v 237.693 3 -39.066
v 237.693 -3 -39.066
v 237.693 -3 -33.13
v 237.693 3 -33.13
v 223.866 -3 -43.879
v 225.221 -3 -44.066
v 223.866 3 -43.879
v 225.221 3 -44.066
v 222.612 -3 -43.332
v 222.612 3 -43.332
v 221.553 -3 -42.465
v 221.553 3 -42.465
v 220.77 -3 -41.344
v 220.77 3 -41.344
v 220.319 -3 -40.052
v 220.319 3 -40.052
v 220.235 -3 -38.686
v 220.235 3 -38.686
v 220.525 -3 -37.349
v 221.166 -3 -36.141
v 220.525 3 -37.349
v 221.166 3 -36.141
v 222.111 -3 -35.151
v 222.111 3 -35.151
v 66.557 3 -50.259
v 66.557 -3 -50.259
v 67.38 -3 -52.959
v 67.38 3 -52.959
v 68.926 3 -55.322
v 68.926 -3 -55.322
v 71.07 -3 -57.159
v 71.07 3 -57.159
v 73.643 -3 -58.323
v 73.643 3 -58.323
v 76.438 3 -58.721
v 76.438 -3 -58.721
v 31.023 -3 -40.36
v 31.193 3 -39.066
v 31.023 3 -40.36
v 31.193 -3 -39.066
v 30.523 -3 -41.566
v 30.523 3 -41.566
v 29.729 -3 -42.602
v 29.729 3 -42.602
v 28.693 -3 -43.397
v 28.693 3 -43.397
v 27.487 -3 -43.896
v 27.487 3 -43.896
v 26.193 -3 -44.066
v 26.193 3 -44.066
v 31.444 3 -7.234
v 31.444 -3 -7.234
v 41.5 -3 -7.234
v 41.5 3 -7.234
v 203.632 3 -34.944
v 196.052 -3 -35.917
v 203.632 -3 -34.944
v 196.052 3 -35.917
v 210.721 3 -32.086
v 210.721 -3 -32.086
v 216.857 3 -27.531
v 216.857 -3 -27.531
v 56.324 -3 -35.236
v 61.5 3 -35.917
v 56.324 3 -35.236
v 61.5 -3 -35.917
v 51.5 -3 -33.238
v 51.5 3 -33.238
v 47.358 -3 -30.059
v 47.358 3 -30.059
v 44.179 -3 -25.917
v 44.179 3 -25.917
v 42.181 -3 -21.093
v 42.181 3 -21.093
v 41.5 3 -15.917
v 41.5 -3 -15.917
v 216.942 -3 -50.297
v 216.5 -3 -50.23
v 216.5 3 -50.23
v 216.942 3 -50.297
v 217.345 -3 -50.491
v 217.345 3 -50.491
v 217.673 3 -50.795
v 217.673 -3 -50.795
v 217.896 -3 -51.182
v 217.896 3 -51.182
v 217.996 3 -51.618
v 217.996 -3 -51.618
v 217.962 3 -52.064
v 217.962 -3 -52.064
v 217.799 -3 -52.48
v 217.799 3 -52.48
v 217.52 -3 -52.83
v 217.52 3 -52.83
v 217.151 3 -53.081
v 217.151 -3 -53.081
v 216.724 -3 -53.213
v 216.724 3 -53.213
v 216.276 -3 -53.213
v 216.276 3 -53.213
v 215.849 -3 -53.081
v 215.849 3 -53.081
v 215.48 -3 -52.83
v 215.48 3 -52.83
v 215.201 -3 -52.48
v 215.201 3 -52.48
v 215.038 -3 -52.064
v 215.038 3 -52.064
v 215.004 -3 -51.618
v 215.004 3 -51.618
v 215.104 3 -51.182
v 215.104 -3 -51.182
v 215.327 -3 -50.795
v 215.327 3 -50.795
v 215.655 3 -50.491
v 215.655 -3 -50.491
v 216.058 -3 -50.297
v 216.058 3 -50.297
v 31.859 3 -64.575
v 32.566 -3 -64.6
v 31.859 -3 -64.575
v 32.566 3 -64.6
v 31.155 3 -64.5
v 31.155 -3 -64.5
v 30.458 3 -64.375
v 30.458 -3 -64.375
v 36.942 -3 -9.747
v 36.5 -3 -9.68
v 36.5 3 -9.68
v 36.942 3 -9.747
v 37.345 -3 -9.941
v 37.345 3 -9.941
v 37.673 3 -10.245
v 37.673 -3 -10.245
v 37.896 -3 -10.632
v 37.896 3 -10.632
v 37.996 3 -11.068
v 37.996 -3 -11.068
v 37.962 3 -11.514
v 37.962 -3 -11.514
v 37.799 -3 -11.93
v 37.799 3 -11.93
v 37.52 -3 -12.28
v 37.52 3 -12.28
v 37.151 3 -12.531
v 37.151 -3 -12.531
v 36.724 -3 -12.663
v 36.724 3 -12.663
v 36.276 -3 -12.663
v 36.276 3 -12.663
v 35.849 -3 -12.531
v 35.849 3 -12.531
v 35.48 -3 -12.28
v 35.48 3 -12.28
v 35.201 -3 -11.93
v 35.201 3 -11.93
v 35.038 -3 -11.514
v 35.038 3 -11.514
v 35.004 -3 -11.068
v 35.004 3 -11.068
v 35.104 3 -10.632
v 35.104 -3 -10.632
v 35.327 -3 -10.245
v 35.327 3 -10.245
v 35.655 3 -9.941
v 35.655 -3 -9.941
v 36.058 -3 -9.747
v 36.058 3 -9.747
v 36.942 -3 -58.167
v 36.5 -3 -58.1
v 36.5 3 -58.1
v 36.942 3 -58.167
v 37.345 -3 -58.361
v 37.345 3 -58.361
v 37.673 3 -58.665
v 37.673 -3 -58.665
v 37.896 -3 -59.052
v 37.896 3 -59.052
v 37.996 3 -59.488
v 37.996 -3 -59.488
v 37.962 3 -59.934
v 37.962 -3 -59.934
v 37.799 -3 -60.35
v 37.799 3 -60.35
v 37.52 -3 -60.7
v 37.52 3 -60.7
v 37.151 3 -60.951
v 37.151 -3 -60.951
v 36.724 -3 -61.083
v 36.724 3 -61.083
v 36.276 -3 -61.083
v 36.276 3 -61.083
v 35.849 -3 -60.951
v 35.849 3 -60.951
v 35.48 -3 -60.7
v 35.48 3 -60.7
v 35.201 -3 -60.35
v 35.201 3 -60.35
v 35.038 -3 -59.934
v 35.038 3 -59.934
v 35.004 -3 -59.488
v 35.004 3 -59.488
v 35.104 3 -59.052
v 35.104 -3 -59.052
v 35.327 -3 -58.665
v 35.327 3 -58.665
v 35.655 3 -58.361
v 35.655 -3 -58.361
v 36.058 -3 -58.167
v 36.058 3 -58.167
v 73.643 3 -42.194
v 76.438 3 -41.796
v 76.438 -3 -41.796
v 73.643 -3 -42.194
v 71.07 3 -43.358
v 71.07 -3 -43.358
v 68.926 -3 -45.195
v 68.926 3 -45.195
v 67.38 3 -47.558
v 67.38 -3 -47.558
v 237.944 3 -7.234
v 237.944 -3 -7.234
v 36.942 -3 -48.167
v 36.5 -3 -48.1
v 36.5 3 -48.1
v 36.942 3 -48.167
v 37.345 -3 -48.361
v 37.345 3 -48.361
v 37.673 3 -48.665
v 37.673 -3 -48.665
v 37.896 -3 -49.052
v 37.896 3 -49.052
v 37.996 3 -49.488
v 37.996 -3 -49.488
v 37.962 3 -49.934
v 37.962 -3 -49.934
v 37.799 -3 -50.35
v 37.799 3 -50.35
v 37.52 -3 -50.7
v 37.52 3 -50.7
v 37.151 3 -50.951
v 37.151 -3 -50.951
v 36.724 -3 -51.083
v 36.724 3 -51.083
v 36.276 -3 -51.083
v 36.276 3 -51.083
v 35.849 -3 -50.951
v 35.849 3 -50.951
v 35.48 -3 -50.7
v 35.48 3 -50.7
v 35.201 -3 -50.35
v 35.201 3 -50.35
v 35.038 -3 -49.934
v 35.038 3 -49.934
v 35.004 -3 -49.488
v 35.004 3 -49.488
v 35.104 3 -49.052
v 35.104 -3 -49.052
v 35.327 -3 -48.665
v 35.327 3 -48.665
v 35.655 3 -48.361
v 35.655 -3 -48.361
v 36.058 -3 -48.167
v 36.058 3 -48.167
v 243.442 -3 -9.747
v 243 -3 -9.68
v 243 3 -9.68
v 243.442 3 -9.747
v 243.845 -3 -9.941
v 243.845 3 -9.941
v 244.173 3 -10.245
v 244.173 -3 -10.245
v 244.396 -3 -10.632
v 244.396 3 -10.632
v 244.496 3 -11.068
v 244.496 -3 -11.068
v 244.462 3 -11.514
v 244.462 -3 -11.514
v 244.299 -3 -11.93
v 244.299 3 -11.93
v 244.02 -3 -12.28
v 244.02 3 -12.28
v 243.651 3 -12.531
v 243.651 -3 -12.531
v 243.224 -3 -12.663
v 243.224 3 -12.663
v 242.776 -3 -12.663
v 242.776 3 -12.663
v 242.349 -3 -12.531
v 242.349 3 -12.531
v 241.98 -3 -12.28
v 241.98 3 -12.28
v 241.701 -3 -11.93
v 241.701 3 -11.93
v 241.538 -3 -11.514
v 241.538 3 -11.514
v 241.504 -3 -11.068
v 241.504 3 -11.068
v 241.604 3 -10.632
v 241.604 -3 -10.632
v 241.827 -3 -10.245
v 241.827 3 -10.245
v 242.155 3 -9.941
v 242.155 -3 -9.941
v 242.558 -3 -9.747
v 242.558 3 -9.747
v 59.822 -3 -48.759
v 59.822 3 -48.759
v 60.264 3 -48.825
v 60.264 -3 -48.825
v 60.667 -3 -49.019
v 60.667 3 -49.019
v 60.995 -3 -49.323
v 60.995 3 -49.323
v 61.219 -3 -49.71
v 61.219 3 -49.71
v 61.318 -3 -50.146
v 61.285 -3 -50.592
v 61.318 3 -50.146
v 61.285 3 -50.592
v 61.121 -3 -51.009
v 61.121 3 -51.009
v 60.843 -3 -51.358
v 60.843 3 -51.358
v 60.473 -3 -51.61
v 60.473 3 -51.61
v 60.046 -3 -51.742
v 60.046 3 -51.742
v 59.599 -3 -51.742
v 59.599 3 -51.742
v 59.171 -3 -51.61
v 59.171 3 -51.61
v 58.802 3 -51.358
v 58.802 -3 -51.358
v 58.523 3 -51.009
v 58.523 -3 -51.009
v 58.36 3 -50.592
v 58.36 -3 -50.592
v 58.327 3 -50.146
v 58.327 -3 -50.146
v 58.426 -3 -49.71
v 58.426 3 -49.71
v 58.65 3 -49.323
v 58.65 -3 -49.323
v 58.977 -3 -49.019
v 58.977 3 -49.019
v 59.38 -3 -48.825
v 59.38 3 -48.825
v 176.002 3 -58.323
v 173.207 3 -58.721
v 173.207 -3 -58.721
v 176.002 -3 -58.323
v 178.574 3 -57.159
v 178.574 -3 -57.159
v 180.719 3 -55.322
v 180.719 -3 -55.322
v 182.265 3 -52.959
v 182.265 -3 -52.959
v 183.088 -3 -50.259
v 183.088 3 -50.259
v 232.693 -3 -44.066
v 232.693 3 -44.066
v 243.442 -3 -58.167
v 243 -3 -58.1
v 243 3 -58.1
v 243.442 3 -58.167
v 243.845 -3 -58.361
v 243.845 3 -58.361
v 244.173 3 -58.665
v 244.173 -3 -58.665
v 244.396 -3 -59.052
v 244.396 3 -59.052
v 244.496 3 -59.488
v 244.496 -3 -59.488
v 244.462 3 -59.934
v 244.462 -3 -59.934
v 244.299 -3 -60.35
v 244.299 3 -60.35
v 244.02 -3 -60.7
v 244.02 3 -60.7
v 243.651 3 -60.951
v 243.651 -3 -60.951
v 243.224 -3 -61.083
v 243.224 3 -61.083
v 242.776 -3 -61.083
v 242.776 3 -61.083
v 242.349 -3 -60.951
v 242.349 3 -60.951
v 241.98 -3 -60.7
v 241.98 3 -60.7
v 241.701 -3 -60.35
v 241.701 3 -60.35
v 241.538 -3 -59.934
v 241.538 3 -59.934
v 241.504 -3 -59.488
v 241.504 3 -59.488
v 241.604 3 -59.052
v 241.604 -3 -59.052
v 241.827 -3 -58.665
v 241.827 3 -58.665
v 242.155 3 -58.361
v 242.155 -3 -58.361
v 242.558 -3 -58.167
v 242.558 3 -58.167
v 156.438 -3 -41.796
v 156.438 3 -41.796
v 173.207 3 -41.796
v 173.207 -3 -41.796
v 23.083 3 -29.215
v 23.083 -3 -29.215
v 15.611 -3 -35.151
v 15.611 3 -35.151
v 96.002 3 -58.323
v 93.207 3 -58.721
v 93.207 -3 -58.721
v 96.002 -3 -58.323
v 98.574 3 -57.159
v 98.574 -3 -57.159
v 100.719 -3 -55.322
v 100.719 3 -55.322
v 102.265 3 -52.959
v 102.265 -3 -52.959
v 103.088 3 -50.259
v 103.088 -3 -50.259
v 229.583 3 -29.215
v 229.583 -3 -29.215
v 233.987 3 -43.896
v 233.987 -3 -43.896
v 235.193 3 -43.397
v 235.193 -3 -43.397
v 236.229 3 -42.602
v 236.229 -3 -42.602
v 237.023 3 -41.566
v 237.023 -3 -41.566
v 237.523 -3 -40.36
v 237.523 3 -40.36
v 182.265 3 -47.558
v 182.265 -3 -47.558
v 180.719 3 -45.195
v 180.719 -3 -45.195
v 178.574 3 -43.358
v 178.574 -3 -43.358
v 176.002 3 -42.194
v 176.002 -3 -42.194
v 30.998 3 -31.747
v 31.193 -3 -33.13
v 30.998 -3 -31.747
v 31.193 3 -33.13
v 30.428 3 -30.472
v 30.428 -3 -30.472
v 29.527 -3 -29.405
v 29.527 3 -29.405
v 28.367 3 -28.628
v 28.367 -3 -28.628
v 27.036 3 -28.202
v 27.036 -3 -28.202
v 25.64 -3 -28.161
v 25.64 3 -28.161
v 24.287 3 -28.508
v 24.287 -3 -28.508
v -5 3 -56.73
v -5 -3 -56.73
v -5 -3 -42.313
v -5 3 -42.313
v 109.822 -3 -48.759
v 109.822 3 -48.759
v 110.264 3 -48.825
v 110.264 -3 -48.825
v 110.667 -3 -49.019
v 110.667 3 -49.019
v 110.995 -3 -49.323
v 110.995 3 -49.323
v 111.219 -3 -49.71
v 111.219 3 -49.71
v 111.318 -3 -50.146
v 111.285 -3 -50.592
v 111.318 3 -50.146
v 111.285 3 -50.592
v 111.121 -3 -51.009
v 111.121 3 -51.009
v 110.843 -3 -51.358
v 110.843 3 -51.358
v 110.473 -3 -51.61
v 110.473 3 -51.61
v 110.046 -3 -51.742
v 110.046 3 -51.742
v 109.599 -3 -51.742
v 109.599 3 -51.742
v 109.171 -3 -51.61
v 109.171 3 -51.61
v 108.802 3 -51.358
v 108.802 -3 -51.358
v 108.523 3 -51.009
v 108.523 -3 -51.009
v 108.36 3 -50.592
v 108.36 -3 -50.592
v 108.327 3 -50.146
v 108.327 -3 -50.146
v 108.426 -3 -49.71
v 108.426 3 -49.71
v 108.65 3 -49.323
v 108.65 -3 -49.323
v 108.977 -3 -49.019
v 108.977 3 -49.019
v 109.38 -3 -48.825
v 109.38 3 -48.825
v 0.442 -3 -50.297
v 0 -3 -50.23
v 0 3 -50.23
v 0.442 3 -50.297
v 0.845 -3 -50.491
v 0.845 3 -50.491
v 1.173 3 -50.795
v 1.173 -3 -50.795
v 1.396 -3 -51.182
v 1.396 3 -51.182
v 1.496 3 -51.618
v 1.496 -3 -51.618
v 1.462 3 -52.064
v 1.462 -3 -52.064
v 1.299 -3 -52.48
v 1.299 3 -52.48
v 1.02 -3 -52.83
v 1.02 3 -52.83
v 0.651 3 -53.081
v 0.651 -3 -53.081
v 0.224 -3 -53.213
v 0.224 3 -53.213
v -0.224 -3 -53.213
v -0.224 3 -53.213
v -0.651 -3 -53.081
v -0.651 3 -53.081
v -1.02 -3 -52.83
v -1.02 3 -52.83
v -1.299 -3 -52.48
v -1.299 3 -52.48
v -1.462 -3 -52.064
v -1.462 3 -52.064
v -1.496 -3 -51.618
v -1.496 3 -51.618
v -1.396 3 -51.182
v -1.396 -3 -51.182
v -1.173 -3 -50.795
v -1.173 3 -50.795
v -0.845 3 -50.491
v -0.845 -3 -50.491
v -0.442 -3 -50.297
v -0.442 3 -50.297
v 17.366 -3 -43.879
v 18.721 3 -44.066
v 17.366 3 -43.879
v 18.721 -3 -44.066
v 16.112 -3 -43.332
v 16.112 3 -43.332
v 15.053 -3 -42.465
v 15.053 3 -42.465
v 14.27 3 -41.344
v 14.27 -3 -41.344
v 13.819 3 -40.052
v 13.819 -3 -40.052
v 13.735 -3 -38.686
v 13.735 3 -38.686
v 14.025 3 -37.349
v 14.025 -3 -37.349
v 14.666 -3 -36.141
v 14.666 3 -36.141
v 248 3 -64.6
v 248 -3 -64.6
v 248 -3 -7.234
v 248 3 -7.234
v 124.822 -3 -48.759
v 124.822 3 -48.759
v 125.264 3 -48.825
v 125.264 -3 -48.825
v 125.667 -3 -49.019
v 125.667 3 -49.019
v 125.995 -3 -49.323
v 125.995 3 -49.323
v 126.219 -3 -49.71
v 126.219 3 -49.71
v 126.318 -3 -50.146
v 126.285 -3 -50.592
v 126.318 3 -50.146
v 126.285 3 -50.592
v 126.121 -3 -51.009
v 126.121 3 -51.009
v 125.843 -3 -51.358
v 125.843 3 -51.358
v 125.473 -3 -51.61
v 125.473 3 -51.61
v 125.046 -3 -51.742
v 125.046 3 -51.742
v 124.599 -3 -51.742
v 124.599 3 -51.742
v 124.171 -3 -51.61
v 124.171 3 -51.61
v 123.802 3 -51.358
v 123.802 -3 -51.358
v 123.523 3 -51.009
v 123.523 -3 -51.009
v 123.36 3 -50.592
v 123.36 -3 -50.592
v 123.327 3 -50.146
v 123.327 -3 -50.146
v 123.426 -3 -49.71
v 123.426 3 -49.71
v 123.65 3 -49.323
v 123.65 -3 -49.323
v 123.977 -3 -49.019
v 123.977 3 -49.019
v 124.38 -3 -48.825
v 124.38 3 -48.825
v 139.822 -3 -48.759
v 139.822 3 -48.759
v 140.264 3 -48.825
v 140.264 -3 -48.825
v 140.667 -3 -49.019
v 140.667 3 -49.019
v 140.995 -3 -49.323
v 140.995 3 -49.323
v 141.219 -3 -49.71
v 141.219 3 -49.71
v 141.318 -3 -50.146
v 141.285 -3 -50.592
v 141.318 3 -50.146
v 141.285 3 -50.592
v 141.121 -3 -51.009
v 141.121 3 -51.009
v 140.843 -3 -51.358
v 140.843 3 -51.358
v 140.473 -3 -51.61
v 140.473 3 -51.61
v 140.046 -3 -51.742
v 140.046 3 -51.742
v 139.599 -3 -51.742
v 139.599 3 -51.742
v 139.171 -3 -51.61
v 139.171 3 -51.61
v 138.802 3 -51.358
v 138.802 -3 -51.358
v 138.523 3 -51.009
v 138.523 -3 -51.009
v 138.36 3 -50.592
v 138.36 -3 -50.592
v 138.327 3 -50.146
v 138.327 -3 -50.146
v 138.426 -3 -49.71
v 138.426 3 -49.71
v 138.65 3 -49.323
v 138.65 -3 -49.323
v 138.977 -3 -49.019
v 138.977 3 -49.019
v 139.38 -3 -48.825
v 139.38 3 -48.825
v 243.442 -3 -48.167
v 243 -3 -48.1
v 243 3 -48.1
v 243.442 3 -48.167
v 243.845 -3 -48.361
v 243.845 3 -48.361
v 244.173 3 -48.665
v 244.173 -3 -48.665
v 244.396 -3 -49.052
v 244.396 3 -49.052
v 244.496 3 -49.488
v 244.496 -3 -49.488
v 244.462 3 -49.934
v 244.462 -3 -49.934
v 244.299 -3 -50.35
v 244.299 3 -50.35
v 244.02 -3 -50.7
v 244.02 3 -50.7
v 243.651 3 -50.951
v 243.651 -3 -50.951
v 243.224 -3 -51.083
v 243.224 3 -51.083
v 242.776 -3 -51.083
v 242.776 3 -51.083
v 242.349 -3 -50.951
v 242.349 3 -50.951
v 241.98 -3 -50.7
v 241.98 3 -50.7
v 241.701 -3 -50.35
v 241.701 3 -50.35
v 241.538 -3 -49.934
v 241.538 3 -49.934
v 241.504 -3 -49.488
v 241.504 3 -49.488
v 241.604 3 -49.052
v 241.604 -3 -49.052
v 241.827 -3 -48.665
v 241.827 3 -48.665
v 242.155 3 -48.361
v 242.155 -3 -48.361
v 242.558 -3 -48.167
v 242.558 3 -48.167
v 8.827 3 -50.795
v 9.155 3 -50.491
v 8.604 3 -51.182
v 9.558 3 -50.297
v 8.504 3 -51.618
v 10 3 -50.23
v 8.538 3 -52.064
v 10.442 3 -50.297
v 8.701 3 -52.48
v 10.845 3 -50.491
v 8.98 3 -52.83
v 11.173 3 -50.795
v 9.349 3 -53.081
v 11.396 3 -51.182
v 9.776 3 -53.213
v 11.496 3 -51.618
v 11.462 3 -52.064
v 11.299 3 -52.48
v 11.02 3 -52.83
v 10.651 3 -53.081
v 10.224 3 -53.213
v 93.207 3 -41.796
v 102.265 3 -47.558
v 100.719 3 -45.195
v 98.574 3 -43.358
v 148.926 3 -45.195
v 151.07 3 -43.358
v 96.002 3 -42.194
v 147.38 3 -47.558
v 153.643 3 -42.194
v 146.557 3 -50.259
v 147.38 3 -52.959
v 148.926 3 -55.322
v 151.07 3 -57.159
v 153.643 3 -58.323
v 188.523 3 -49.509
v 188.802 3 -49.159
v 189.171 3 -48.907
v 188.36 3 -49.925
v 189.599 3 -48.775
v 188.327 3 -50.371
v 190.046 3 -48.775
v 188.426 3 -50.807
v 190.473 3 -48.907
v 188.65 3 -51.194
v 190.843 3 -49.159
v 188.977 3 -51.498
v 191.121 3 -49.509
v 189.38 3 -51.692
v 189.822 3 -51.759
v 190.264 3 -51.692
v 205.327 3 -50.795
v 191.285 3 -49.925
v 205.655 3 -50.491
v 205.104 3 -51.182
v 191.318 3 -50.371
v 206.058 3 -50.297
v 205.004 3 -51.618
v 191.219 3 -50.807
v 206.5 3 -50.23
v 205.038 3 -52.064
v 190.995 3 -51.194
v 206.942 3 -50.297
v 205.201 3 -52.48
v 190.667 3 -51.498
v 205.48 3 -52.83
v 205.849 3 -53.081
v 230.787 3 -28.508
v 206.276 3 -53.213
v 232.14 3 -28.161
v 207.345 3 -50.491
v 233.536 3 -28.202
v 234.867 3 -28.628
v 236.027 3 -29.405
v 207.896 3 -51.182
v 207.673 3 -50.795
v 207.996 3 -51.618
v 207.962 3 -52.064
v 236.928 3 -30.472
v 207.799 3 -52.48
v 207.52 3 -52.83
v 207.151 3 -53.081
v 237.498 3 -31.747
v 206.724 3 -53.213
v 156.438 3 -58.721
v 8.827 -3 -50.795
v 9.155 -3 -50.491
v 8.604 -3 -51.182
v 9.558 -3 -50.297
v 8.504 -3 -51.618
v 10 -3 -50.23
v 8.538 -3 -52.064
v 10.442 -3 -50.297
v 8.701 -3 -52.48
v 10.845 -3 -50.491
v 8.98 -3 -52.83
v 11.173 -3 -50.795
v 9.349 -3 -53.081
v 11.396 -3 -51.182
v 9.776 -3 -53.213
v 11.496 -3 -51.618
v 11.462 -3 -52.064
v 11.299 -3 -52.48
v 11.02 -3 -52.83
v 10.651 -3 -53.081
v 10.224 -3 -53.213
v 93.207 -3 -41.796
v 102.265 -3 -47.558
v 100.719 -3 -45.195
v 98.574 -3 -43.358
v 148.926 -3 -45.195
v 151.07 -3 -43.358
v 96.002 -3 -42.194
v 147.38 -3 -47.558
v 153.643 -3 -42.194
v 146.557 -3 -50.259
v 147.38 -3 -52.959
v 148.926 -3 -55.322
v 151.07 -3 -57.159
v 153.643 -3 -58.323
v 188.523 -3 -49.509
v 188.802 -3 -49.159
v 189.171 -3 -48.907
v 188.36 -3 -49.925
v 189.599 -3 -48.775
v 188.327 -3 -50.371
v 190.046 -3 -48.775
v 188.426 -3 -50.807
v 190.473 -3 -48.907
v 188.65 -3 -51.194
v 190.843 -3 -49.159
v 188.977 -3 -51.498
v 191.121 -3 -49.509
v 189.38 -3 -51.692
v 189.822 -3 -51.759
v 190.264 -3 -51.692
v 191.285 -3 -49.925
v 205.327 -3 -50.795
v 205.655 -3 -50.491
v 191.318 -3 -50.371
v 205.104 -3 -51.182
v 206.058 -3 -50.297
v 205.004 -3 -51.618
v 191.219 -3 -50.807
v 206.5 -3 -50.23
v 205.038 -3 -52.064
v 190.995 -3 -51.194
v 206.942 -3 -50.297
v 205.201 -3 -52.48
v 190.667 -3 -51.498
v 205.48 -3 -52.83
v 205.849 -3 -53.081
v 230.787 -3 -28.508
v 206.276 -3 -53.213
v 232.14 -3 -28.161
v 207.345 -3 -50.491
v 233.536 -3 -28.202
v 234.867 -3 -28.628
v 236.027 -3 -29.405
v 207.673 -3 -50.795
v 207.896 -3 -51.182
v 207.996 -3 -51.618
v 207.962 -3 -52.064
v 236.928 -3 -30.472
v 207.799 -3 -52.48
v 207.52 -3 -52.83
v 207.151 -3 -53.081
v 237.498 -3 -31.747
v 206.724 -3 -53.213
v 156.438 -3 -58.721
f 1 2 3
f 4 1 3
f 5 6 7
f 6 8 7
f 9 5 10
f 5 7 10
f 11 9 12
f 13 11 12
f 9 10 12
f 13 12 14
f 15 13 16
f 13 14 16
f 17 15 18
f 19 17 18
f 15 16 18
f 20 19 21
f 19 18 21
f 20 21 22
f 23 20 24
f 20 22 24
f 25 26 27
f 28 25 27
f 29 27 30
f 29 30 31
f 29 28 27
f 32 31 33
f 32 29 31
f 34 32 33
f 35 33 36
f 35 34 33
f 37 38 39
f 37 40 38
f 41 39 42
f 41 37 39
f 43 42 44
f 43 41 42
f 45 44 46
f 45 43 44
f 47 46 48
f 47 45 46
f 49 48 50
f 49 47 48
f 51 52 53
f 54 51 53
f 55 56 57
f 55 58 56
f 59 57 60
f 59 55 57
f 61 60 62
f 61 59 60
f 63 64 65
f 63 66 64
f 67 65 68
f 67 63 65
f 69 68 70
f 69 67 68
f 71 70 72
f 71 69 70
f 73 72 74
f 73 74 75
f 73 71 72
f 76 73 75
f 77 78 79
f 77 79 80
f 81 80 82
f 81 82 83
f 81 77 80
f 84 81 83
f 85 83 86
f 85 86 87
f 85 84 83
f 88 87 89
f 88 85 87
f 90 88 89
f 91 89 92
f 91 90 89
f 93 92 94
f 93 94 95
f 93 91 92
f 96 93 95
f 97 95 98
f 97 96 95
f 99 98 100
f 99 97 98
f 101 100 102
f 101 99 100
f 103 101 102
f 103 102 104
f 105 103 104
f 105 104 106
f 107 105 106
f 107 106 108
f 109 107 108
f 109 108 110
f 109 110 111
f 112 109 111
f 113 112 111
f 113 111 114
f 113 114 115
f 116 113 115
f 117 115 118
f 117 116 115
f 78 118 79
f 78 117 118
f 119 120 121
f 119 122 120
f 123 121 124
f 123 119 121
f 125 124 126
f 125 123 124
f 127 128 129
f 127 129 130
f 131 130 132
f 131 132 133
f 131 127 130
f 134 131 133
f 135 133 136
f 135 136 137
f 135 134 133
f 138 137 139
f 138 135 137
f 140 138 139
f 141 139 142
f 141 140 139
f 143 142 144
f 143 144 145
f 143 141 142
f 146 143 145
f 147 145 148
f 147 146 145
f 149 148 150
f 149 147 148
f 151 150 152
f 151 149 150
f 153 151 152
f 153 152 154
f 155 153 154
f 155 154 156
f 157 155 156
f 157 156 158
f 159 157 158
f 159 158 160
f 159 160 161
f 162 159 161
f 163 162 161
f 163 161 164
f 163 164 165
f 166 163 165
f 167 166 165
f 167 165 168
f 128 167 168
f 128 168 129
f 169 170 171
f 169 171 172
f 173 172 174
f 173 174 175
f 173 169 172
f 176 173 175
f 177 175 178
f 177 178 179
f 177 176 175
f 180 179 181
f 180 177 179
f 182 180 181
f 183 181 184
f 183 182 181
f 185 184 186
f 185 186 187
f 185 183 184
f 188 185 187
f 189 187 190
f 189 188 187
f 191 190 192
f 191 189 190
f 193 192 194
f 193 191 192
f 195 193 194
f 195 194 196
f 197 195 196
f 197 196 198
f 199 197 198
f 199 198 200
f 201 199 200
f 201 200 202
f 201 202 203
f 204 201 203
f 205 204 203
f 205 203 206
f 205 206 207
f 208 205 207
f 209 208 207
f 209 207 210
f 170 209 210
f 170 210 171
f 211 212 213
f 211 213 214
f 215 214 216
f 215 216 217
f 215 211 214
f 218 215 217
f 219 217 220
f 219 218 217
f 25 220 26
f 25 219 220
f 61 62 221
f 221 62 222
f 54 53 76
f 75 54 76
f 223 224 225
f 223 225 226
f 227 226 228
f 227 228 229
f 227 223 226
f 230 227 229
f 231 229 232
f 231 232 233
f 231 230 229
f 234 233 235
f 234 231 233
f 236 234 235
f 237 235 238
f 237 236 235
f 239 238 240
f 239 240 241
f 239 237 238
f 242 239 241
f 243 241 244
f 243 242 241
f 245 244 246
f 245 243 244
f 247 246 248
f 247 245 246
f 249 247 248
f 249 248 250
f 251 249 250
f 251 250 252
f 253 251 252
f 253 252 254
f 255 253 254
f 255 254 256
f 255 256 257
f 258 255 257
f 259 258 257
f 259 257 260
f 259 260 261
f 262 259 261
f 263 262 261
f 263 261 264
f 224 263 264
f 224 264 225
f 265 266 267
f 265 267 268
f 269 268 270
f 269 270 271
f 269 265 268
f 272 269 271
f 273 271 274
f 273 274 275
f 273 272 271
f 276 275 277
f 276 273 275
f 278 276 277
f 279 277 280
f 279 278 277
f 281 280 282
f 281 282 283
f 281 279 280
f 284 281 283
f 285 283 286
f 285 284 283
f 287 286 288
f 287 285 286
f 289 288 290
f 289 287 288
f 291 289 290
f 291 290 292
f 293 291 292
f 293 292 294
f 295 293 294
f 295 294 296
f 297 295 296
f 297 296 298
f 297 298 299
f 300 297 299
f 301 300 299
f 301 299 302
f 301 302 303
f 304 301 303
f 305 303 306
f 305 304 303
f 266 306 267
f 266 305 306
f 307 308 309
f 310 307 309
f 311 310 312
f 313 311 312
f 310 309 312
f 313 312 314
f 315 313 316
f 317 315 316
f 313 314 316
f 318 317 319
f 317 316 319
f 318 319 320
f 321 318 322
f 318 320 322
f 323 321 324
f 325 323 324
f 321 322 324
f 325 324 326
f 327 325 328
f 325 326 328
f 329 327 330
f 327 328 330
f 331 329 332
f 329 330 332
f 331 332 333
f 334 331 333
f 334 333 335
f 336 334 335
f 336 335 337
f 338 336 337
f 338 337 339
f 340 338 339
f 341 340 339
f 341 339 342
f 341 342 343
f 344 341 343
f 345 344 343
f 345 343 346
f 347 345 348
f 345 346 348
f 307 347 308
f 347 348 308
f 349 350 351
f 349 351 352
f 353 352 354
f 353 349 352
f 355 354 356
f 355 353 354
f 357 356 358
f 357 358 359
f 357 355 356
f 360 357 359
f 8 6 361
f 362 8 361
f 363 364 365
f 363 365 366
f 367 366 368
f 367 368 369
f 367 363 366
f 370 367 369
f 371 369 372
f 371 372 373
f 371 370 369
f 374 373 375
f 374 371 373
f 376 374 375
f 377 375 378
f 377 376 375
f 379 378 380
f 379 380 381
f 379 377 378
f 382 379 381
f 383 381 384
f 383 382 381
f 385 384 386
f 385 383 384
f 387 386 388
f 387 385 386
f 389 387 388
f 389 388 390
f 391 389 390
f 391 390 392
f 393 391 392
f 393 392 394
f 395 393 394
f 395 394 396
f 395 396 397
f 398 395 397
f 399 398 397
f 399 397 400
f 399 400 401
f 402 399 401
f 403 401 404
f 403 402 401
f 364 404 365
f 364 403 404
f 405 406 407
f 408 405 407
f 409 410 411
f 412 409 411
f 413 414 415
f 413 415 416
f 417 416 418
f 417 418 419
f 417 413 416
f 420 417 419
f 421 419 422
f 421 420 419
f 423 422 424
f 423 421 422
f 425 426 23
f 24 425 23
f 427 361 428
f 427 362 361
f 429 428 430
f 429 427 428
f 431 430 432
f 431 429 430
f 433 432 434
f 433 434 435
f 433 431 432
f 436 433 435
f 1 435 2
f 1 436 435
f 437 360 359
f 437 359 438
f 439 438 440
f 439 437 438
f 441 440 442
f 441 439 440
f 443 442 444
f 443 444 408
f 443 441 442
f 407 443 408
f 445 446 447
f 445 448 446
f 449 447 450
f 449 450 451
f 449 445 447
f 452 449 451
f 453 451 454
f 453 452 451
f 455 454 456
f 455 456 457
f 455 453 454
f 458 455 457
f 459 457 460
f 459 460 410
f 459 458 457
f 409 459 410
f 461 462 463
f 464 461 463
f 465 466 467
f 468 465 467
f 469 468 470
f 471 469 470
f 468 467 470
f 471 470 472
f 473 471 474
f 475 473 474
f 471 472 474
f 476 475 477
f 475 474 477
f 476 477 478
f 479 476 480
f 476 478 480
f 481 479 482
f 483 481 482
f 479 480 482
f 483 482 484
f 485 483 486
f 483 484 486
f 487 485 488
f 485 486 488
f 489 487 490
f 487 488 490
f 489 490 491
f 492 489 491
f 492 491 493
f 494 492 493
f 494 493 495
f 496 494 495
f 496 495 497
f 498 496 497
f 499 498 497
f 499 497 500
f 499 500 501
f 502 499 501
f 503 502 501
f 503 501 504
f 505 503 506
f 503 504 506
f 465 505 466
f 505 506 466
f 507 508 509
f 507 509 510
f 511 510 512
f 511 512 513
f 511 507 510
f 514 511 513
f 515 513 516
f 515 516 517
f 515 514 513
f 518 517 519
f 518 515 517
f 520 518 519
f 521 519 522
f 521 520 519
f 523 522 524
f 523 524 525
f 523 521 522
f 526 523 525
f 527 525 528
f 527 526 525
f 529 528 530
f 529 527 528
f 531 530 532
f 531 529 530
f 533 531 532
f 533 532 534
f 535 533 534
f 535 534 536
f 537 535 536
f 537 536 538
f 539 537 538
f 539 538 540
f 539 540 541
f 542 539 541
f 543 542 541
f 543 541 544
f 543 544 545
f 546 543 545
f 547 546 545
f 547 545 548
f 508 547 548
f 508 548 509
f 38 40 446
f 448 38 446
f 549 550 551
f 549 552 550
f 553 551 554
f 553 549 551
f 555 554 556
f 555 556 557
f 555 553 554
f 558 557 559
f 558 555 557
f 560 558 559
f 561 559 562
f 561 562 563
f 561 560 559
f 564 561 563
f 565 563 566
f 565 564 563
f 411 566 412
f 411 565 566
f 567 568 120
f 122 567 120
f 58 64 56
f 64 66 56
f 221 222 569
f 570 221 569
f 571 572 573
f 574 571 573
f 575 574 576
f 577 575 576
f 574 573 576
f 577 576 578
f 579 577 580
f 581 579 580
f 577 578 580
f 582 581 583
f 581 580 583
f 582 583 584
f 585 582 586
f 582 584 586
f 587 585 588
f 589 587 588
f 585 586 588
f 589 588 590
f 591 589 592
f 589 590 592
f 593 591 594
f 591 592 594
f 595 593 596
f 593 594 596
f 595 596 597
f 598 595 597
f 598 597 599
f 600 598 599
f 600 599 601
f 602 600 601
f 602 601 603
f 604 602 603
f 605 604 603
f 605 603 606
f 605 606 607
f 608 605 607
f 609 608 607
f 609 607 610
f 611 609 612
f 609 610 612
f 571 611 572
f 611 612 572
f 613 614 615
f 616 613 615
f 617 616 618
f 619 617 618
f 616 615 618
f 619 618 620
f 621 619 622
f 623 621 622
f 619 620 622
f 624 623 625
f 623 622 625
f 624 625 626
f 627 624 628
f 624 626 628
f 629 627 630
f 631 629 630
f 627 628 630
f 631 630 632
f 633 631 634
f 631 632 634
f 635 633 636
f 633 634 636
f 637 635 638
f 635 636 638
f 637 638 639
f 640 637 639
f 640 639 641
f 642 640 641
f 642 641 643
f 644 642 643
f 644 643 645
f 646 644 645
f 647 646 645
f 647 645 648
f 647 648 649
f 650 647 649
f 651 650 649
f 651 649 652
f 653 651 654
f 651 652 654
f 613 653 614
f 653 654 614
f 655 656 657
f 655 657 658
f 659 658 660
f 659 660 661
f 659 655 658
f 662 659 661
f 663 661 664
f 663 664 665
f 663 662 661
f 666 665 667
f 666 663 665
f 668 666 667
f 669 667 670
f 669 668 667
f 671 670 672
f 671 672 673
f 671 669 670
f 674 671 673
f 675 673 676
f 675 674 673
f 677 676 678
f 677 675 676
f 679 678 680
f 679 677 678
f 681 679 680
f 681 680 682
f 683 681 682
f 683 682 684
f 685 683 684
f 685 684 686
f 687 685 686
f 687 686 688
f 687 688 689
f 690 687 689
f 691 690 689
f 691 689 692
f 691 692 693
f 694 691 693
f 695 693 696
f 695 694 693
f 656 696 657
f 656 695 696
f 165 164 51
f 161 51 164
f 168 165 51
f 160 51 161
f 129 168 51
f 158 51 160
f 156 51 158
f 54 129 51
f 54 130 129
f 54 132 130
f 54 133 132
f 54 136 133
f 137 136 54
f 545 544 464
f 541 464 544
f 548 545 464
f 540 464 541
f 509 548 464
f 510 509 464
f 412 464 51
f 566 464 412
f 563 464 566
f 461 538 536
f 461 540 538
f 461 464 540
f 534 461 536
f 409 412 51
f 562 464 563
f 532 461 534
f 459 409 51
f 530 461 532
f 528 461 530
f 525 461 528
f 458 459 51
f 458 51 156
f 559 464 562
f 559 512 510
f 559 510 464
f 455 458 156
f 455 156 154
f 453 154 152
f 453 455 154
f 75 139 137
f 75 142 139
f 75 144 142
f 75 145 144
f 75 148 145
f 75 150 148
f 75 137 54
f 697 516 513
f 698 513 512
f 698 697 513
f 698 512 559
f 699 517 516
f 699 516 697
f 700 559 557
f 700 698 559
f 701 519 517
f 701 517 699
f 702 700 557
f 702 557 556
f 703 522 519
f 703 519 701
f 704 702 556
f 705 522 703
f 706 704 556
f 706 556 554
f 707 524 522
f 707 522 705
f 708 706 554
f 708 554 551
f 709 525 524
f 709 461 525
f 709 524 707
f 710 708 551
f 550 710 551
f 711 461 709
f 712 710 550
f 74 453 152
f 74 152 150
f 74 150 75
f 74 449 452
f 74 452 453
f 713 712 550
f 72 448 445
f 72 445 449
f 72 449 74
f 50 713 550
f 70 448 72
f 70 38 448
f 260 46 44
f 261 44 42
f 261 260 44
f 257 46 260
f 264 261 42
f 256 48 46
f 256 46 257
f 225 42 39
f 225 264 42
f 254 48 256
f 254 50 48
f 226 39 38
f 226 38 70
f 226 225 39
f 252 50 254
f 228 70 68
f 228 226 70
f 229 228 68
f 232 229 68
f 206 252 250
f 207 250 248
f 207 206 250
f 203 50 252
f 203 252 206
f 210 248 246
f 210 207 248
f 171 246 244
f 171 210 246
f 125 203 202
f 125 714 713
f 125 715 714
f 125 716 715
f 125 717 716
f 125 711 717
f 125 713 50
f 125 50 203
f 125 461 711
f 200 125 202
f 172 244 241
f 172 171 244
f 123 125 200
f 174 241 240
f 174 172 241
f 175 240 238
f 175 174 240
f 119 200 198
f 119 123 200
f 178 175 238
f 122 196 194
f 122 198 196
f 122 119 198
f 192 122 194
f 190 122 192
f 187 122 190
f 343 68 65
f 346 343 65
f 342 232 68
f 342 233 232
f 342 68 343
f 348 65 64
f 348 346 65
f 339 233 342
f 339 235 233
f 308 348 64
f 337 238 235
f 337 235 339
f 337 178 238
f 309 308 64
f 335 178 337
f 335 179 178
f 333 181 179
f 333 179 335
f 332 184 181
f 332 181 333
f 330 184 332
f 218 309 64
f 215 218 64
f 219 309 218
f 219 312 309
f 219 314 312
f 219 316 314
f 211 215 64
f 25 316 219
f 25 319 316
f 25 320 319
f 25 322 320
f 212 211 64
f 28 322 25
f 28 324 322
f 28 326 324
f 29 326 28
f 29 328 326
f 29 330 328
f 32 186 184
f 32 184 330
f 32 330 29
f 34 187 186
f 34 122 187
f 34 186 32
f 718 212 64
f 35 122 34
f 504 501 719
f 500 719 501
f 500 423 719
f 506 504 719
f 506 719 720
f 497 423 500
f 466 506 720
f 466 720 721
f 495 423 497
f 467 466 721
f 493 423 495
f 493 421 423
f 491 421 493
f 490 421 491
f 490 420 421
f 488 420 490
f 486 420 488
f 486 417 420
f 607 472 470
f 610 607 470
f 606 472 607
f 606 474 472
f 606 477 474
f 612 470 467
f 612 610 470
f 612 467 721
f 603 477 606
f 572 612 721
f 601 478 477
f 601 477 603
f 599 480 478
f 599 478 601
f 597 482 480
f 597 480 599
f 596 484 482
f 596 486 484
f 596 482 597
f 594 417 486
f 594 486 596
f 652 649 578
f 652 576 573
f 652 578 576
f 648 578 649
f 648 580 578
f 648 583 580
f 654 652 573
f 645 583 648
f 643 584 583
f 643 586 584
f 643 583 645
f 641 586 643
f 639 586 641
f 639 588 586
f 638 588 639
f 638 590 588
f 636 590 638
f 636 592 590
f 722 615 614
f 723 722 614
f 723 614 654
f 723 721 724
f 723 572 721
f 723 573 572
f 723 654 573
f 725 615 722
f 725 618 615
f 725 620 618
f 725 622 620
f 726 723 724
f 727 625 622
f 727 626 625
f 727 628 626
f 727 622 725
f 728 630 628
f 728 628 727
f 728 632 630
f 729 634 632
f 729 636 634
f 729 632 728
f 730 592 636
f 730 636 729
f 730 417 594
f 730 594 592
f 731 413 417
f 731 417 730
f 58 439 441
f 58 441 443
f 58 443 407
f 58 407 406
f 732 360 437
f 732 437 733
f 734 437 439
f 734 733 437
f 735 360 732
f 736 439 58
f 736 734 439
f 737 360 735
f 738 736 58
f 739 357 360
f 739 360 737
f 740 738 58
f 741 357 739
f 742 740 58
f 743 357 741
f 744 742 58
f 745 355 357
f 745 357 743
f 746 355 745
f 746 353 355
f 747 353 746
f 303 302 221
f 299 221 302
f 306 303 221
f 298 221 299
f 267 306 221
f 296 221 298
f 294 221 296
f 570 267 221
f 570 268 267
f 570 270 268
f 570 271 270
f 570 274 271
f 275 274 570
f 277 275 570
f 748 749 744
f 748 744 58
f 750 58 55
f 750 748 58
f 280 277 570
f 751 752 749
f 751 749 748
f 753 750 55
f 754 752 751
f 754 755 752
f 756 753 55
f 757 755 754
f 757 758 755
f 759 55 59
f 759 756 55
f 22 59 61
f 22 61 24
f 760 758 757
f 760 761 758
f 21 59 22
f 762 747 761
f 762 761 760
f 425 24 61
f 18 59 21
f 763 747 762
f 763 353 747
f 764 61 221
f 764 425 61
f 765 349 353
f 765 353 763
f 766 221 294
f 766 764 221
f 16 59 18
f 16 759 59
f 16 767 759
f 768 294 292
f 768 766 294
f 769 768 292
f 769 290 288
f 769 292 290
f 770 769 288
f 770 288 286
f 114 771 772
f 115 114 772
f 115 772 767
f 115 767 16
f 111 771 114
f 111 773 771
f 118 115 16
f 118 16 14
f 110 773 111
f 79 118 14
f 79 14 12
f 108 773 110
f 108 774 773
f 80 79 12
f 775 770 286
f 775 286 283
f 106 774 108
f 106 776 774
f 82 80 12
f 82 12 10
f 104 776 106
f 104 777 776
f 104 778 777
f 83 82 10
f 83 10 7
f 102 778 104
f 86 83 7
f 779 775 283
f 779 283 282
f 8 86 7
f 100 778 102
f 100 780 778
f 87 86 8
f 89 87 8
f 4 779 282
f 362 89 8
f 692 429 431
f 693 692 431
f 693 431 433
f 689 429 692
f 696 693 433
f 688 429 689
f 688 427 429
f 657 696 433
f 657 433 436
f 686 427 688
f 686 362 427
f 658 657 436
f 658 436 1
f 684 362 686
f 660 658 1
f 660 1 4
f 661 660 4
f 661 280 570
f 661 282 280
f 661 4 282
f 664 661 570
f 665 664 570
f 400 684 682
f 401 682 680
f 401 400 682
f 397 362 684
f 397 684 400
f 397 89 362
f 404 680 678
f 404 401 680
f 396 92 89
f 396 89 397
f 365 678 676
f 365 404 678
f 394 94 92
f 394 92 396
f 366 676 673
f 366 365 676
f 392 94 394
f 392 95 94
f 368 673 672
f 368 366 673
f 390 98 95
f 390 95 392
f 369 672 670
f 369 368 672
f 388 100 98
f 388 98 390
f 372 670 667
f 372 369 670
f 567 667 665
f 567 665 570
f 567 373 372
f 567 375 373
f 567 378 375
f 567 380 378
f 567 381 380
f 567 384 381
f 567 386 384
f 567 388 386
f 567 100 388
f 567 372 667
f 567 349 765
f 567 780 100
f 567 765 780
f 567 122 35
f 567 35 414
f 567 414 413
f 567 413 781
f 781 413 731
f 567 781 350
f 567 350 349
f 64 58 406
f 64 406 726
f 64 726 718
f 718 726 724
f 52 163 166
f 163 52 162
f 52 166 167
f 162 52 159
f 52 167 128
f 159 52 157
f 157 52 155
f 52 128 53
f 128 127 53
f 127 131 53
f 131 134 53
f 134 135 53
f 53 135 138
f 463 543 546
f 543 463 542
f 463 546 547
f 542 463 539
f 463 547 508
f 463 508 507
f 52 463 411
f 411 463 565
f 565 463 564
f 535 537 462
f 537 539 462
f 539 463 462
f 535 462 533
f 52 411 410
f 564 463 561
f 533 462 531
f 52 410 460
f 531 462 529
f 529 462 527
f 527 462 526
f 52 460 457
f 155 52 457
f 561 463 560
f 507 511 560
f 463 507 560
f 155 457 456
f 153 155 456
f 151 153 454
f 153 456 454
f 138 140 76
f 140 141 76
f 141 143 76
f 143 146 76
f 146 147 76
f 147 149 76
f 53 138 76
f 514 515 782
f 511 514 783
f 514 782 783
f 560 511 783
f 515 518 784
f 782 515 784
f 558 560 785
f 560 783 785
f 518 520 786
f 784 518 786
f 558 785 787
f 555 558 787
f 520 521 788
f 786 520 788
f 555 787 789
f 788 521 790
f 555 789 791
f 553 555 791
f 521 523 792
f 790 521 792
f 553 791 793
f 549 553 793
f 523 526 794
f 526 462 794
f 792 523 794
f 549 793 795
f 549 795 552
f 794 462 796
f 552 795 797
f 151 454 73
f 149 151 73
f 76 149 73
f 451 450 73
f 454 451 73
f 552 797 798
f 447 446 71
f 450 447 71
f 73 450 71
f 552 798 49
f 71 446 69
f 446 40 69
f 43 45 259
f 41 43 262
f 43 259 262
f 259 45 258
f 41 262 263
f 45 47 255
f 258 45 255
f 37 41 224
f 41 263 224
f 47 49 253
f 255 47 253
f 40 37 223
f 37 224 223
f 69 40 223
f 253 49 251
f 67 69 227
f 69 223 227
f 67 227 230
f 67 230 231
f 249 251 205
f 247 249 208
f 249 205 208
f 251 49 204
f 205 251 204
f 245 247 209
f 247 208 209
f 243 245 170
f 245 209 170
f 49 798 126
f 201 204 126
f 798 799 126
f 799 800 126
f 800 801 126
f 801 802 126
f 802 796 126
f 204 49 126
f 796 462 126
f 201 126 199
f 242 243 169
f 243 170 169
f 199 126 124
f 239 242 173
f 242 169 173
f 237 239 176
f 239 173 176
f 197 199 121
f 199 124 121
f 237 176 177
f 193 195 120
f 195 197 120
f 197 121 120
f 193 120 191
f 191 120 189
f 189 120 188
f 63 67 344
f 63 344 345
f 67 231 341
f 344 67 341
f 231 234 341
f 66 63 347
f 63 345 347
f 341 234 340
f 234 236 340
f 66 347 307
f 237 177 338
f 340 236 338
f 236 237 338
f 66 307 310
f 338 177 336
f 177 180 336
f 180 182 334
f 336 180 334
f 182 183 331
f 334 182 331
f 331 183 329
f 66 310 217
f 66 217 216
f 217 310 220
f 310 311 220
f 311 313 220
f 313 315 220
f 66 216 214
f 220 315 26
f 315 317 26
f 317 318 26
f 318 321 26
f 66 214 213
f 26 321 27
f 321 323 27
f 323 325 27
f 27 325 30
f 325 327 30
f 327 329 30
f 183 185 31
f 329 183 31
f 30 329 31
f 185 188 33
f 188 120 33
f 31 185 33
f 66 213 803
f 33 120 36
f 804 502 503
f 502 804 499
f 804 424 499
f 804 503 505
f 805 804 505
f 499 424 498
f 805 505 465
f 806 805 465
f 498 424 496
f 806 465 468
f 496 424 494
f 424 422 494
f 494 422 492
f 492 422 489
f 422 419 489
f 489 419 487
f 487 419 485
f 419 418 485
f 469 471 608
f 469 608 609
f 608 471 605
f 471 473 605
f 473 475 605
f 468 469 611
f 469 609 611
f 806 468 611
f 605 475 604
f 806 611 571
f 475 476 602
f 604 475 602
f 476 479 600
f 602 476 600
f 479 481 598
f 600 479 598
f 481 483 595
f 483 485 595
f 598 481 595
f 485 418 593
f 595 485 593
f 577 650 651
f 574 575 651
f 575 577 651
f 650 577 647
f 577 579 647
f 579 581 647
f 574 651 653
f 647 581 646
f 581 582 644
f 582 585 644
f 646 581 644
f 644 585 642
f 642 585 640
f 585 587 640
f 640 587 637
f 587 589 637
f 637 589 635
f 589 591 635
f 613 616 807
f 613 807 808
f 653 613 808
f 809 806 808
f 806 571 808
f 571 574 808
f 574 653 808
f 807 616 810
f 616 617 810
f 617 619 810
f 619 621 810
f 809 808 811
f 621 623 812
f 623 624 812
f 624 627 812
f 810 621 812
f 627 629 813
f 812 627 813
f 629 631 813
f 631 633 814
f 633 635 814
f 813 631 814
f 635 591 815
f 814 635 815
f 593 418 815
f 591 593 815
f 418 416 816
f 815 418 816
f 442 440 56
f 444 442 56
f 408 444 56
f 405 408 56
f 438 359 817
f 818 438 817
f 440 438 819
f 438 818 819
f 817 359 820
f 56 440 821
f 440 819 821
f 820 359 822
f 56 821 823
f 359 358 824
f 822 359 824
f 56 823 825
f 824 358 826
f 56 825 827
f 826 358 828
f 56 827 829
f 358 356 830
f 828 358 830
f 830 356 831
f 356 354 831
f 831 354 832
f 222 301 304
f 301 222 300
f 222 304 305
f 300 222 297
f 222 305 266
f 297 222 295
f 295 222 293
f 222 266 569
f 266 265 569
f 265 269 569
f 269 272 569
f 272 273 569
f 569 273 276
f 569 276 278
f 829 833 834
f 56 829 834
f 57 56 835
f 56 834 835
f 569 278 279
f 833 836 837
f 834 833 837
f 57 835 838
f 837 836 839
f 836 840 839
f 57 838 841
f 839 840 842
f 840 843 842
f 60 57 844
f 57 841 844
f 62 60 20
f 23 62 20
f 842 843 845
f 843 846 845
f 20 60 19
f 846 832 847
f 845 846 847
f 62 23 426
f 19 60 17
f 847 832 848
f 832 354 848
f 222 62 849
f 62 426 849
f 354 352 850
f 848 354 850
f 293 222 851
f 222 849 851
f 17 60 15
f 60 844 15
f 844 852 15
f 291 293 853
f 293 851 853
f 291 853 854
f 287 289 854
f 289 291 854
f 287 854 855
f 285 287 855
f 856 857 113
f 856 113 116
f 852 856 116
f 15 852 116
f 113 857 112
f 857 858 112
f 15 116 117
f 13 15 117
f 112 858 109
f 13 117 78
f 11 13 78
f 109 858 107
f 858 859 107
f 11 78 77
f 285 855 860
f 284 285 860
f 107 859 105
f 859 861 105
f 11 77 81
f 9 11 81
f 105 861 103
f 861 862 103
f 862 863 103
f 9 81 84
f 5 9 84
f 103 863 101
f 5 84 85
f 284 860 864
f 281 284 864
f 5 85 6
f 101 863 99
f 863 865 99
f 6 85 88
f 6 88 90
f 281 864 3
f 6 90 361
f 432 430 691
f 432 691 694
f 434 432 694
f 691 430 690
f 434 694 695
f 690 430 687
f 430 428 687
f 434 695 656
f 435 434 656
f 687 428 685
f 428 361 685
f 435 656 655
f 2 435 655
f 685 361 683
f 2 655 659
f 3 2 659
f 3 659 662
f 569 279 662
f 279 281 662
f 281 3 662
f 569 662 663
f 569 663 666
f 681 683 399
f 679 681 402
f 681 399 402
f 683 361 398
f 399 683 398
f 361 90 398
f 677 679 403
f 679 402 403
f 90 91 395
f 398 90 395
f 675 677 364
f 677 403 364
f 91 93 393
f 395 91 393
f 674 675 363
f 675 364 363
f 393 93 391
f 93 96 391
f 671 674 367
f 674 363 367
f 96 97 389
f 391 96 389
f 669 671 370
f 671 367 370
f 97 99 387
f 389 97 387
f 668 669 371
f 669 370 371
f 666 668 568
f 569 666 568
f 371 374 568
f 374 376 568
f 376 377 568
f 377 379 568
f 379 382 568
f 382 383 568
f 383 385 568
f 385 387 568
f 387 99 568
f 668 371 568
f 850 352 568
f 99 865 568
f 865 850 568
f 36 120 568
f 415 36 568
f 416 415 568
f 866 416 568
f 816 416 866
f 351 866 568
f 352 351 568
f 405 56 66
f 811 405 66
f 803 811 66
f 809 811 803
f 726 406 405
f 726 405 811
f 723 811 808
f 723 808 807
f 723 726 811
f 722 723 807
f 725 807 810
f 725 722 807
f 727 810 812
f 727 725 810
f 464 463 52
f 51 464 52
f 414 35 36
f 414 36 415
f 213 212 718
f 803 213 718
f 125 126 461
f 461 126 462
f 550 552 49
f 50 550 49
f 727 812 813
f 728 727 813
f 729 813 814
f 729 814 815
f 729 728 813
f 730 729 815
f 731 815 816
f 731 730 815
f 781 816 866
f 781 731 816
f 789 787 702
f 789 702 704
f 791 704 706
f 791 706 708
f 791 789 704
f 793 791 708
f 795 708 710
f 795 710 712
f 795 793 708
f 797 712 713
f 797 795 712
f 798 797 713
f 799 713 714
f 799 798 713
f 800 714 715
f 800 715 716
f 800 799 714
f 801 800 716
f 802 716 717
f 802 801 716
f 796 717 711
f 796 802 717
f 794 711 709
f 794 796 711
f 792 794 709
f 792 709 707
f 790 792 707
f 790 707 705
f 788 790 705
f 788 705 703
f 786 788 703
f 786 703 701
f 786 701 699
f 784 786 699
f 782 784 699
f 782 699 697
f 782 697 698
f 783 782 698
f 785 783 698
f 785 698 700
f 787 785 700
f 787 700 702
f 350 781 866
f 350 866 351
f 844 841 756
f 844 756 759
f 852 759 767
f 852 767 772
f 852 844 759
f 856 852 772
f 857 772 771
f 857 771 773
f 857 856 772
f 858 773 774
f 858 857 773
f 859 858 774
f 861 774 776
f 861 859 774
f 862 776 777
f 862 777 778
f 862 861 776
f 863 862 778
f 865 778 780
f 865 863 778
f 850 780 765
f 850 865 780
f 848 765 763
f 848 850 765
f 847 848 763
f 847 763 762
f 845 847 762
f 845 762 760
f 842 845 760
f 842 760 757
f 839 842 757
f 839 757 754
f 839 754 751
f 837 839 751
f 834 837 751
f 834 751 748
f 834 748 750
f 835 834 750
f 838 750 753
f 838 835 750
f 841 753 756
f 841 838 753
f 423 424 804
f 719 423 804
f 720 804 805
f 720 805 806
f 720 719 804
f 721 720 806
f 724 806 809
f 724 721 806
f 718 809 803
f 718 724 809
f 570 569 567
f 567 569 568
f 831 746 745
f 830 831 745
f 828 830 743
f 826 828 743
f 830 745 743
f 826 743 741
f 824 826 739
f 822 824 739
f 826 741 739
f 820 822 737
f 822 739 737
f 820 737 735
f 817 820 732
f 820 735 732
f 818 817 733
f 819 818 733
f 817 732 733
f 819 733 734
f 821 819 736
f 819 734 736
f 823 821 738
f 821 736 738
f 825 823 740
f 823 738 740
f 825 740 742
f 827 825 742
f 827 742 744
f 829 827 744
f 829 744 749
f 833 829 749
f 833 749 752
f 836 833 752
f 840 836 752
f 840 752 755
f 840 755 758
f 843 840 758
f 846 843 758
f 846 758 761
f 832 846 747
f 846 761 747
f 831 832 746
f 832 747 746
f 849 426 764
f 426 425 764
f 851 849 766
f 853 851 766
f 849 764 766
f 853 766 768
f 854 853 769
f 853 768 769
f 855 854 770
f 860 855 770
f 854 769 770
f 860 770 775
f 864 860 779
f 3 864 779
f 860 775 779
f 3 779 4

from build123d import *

# Parameters (mm, degrees)
SKETCH1_R           = 1.5
BOSS_EXTRUDE1_DEPTH = 3
SKETCH4_R           = 1.5
CUT_EXTRUDE2_DEPTH  = 7
SKETCH5_W           = 46.5
SKETCH5_H           = 2
CUT_EXTRUDE3_DEPTH  = 7
CUT_EXTRUDE4_DEPTH  = 7
CUT_EXTRUDE5_DEPTH  = 7
BOSS_EXTRUDE2_START = -6
SKETCH8_R           = 1.5
BOSS_EXTRUDE2_DEPTH = 6
SKETCH9_R           = 1.5
CUT_EXTRUDE6_DEPTH  = 6
SKETCH10_R          = 1.5
CUT_EXTRUDE7_DEPTH  = 6
SKETCH11_W          = 36.769244088
SKETCH11_H          = 16.925373541
CUT_EXTRUDE8_DEPTH  = 14
FILLET2_R           = 5
FILLET3_R           = 10
FILLET4_R           = 20
FILLET5_R           = 30
FILLET6_R           = 10


with BuildPart() as part:
    # Sketch1 → Boss-Extrude1 (new body)
    # profile 1 of 4: a face of its own
    with BuildSketch(Plane(origin=(0, 0, 0), x_dir=(1, 0, 0), z_dir=(0, 1, 0))):
        Polygon((5, 16.666723622), (5, 56.73), (-5, 56.73), (-5, 5.234024539), (5, 5.234024539), (31.5, 5.234024539), (41.5, 5.234024539), (41.5, 64.6), (31.5, 64.6), (31.5, 54.48), (31.5, 16.666723622), align=None)
        with Locations(Location((0, 10.18, 0), (0, 0, 270))):
            Circle(SKETCH1_R, mode=Mode.SUBTRACT)
        with Locations(Location((36.5, 11.18, 0), (0, 0, 270))):
            Circle(SKETCH1_R, mode=Mode.SUBTRACT)
        with Locations(Location((0, 51.73, 0), (0, 0, 270))):
            Circle(SKETCH1_R, mode=Mode.SUBTRACT)
        with Locations(Location((36.5, 49.6, 0), (0, 0, 270))):
            Circle(SKETCH1_R, mode=Mode.SUBTRACT)
        with Locations(Location((36.5, 59.6, 0), (0, 0, 270))):
            Circle(SKETCH1_R, mode=Mode.SUBTRACT)
    # profile 2 of 4: a face of its own
    with BuildSketch(Plane(origin=(0, 0, 0), x_dir=(1, 0, 0), z_dir=(0, 1, 0))):
        Polygon((-5, 56.73), (5, 56.73), (31.5, 54.48), (31.5, 64.6), align=None)
    # profile 3 of 4: a face of its own
    with BuildSketch(Plane(origin=(0, 0, 0), x_dir=(1, 0, 0), z_dir=(0, 1, 0))):
        Polygon((5, 16.666723622), (5, 56.73), (-5, 56.73), (-5, 5.234024539), (5, 5.234024539), (31.5, 5.234024539), (41.5, 5.234024539), (41.5, 64.6), (31.5, 64.6), (31.5, 54.48), (31.5, 16.666723622), align=None)
        with Locations(Location((0, 10.18, 0), (0, 0, 270))):
            Circle(SKETCH1_R, mode=Mode.SUBTRACT)
        with Locations(Location((36.5, 11.18, 0), (0, 0, 270))):
            Circle(SKETCH1_R, mode=Mode.SUBTRACT)
        with Locations(Location((0, 51.73, 0), (0, 0, 270))):
            Circle(SKETCH1_R, mode=Mode.SUBTRACT)
        with Locations(Location((36.5, 49.6, 0), (0, 0, 270))):
            Circle(SKETCH1_R, mode=Mode.SUBTRACT)
        with Locations(Location((36.5, 59.6, 0), (0, 0, 270))):
            Circle(SKETCH1_R, mode=Mode.SUBTRACT)
    # profile 4 of 4: a face of its own
    with BuildSketch(Plane(origin=(0, 0, 0), x_dir=(1, 0, 0), z_dir=(0, 1, 0))):
        Polygon((31.5, 54.48), (5, 56.73), (5, 16.666723622), (31.5, 16.666723622), align=None)
    extrude(amount=BOSS_EXTRUDE1_DEPTH)

    # Sketch4 → Cut-Extrude2 (cut)
    with BuildSketch(Plane(origin=(0, 3, 0), x_dir=(1, 0, 0), z_dir=(0, 1, 0))):
        with Locations(Location((10, 51.73, 0), (0, 0, 270))):
            Circle(SKETCH4_R)
    extrude(amount=-CUT_EXTRUDE2_DEPTH, mode=Mode.SUBTRACT)

    # Sketch5 → Cut-Extrude3 (cut)
    with BuildSketch(Plane(origin=(0, 3, 0), x_dir=(1, 0, 0), z_dir=(0, 1, 0))):
        with Locations((18.25, 6.234024539)):
            Rectangle(SKETCH5_W, SKETCH5_H)
    extrude(amount=-CUT_EXTRUDE3_DEPTH, mode=Mode.SUBTRACT)

    # Sketch6 → Cut-Extrude4 (cut)
    with BuildSketch(Plane(origin=(0, 3, 0), x_dir=(1, 0, 0), z_dir=(0, 1, 0))):
        Polygon((31.443621834, 7.234024539), (-5, 42.312799573), (-5, 7.234024539), align=None)
    extrude(amount=-CUT_EXTRUDE4_DEPTH, mode=Mode.SUBTRACT)

    # Sketch7 → Cut-Extrude5 (cut)
    with BuildSketch(Plane(origin=(0, 3, 0), x_dir=(1, 0, 0), z_dir=(0, 1, 0))):
        Polygon((31.193110027, 22.772878628), (31.193110027, 44.066382221), (4.388346681, 44.066382221), align=None)
    extrude(amount=-CUT_EXTRUDE5_DEPTH, mode=Mode.SUBTRACT)

    # Sketch8 → Boss-Extrude2 (add)
    # profile 1 of 3: a face of its own
    with BuildSketch(Plane(origin=(0, 3, 0), x_dir=(1, 0, 0), z_dir=(0, 1, 0)).offset(BOSS_EXTRUDE2_START)):
        Polygon((238, 64.6), (41.5, 64.6), (41.5, 35.917012269), (208.144634928, 35.917012269), (201.5, 42.312799573), (201.5, 56.73), align=None)
    # profile 2 of 3: a face of its own
    with BuildSketch(Plane(origin=(0, 3, 0), x_dir=(1, 0, 0), z_dir=(0, 1, 0)).offset(BOSS_EXTRUDE2_START)):
        Polygon((237.943621834, 7.234024539), (248, 7.234024539), (248, 64.6), (238, 64.6), (201.5, 56.73), (201.5, 42.312799573), align=None)
        with Locations(Location((243, 11.18, 0), (0, 0, 270))):
            Circle(SKETCH8_R, mode=Mode.SUBTRACT)
        with Locations(Location((243, 59.6, 0), (0, 0, 270))):
            Circle(SKETCH8_R, mode=Mode.SUBTRACT)
        with Locations(Location((243, 49.6, 0), (0, 0, 270))):
            Circle(SKETCH8_R, mode=Mode.SUBTRACT)
        with Locations(Location((216.5, 51.73, 0), (0, 0, 270))):
            Circle(SKETCH8_R, mode=Mode.SUBTRACT)
        with Locations(Location((206.5, 51.73, 0), (0, 0, 270))):
            Circle(SKETCH8_R, mode=Mode.SUBTRACT)
        Polygon((237.693110027, 44.066382221), (237.693110027, 22.772878628), (210.888346681, 44.066382221), align=None, mode=Mode.SUBTRACT)
    # profile 3 of 3: a face of its own
    with BuildSketch(Plane(origin=(0, 3, 0), x_dir=(1, 0, 0), z_dir=(0, 1, 0)).offset(BOSS_EXTRUDE2_START)):
        Polygon((41.5, 35.917012269), (41.5, 64.6), (31.5, 64.6), (-5, 56.73), (-5, 42.312799573), (31.443621834, 7.234024539), (41.5, 7.234024539), align=None)
        with Locations(Location((36.5, 11.18, 0), (0, 0, 270))):
            Circle(SKETCH8_R, mode=Mode.SUBTRACT)
        Polygon((31.193110027, 22.772878628), (4.388346681, 44.066382221), (31.193110027, 44.066382221), align=None, mode=Mode.SUBTRACT)
        with Locations(Location((36.5, 49.6, 0), (0, 0, 270))):
            Circle(SKETCH8_R, mode=Mode.SUBTRACT)
        with Locations(Location((0, 51.73, 0), (0, 0, 270))):
            Circle(SKETCH8_R, mode=Mode.SUBTRACT)
        with Locations(Location((10, 51.73, 0), (0, 0, 270))):
            Circle(SKETCH8_R, mode=Mode.SUBTRACT)
        with Locations(Location((36.5, 59.6, 0), (0, 0, 270))):
            Circle(SKETCH8_R, mode=Mode.SUBTRACT)
    extrude(amount=BOSS_EXTRUDE2_DEPTH)

    # Sketch9 → Cut-Extrude6 (cut)
    with BuildSketch(Plane(origin=(0, 3, 0), x_dir=(1, 0, 0), z_dir=(0, 1, 0))):
        with Locations(Location((59.822317464, 50.258506135, 0), (0, 0, 270))):
            Circle(SKETCH9_R)
        with Locations(Location((189.822317464, 50.258506135, 0), (0, 0, 90))):
            Circle(SKETCH9_R)
        with Locations(Location((124.822317464, 50.258506135, 0), (0, 0, 270))):
            Circle(SKETCH9_R)
    extrude(amount=-CUT_EXTRUDE6_DEPTH, mode=Mode.SUBTRACT)

    # Sketch10 → Cut-Extrude7 (cut)
    with BuildSketch(Plane(origin=(0, 3, 0), x_dir=(1, 0, 0), z_dir=(0, 1, 0))):
        with Locations(Location((124.822317464, 50.258506135, 0), (0, 0, 270))):
            Circle(SKETCH10_R)
        with Locations(Location((109.822317464, 50.258506135, 0), (0, 0, 270))):
            Circle(SKETCH10_R)
        with Locations(Location((139.822317464, 50.258506135, 0), (0, 0, 270))):
            Circle(SKETCH10_R)
    extrude(amount=-CUT_EXTRUDE7_DEPTH, mode=Mode.SUBTRACT)

    # Sketch11 → Cut-Extrude8 (cut)
    with BuildSketch(Plane(origin=(0, 3, 0), x_dir=(1, 0, 0), z_dir=(0, 1, 0))):
        with Locations((84.822317464, 50.258506135)):
            Rectangle(SKETCH11_W, SKETCH11_H)
        with Locations((164.822317464, 50.258506135)):
            Rectangle(SKETCH11_W, SKETCH11_H)
    extrude(amount=-CUT_EXTRUDE8_DEPTH, mode=Mode.SUBTRACT)

    # Fillet2
    fillet2_edges = [part.edges().sort_by_distance(p)[0] for p in [
        (237.693110027, 0, -22.772878628),
        (237.693110027, 0, -44.066382221),
        (210.888346681, 0, -44.066382221),
        (31.193110027, 0, -22.772878628),
        (4.388346681, 0, -44.066382221),
        (31.193110027, 0, -44.066382221),
    ]]
    fillet(fillet2_edges, radius=FILLET2_R)

    # Fillet3
    # the kernel refuses this fillet: 10 mm, written as the material it adds along each edge
    with BuildSketch(Plane(origin=(183.206939508, 3, -41.795819364), x_dir=(-1, 0, 0), z_dir=(0, -1, 0)), Plane(origin=(146.43769542, 3, -41.795819364), x_dir=(0, 0, -1), z_dir=(0, -1, 0)), Plane(origin=(146.43769542, 3, -58.721192905), x_dir=(1, 0, 0), z_dir=(0, -1, 0)), Plane(origin=(103.206939508, 3, -41.795819364), x_dir=(-1, 0, 0), z_dir=(0, -1, 0)), Plane(origin=(66.43769542, 3, -58.721192905), x_dir=(1, 0, 0), z_dir=(0, -1, 0)), Plane(origin=(103.206939508, 3, -58.721192905), x_dir=(0, 0, 1), z_dir=(0, -1, 0))) as fillet3_piece_1:
        with BuildLine():
            CenterArc((FILLET3_R, FILLET3_R), FILLET3_R, 180, 90)
            Line((0, FILLET3_R), (0, 0))
            Line((0, 0), (FILLET3_R, 0))
        make_face()
    extrude(amount=6)
    with BuildSketch(Plane(origin=(183.206939508, 3, -58.721192905), x_dir=(-1, 0, 0), z_dir=(0, -1, 0)), Plane(origin=(66.43769542, 3, -41.795819364), x_dir=(1, 0, 0), z_dir=(0, -1, 0))) as fillet3_piece_2:
        with BuildLine():
            CenterArc((FILLET3_R, -FILLET3_R), FILLET3_R, 90, 90)
            Line((0, -FILLET3_R), (0, 0))
            Line((0, 0), (FILLET3_R, 0))
        make_face()
    extrude(amount=6)

    # Fillet4
    fillet4_edges = [part.edges().sort_by_distance(p)[0] for p in [
        (41.5, 0, -35.917012269),
    ]]
    fillet(fillet4_edges, radius=FILLET4_R)

    # Fillet5
    fillet5_edges = [part.edges().sort_by_distance(p)[0] for p in [
        (208.144634928, 0, -35.917012269),
    ]]
    fillet(fillet5_edges, radius=FILLET5_R)

    # Fillet6
    fillet6_edges = [part.edges().sort_by_distance(p)[0] for p in [
        (31.5, 0, -64.6),
    ]]
    fillet(fillet6_edges, radius=FILLET6_R)


solid = part.part
